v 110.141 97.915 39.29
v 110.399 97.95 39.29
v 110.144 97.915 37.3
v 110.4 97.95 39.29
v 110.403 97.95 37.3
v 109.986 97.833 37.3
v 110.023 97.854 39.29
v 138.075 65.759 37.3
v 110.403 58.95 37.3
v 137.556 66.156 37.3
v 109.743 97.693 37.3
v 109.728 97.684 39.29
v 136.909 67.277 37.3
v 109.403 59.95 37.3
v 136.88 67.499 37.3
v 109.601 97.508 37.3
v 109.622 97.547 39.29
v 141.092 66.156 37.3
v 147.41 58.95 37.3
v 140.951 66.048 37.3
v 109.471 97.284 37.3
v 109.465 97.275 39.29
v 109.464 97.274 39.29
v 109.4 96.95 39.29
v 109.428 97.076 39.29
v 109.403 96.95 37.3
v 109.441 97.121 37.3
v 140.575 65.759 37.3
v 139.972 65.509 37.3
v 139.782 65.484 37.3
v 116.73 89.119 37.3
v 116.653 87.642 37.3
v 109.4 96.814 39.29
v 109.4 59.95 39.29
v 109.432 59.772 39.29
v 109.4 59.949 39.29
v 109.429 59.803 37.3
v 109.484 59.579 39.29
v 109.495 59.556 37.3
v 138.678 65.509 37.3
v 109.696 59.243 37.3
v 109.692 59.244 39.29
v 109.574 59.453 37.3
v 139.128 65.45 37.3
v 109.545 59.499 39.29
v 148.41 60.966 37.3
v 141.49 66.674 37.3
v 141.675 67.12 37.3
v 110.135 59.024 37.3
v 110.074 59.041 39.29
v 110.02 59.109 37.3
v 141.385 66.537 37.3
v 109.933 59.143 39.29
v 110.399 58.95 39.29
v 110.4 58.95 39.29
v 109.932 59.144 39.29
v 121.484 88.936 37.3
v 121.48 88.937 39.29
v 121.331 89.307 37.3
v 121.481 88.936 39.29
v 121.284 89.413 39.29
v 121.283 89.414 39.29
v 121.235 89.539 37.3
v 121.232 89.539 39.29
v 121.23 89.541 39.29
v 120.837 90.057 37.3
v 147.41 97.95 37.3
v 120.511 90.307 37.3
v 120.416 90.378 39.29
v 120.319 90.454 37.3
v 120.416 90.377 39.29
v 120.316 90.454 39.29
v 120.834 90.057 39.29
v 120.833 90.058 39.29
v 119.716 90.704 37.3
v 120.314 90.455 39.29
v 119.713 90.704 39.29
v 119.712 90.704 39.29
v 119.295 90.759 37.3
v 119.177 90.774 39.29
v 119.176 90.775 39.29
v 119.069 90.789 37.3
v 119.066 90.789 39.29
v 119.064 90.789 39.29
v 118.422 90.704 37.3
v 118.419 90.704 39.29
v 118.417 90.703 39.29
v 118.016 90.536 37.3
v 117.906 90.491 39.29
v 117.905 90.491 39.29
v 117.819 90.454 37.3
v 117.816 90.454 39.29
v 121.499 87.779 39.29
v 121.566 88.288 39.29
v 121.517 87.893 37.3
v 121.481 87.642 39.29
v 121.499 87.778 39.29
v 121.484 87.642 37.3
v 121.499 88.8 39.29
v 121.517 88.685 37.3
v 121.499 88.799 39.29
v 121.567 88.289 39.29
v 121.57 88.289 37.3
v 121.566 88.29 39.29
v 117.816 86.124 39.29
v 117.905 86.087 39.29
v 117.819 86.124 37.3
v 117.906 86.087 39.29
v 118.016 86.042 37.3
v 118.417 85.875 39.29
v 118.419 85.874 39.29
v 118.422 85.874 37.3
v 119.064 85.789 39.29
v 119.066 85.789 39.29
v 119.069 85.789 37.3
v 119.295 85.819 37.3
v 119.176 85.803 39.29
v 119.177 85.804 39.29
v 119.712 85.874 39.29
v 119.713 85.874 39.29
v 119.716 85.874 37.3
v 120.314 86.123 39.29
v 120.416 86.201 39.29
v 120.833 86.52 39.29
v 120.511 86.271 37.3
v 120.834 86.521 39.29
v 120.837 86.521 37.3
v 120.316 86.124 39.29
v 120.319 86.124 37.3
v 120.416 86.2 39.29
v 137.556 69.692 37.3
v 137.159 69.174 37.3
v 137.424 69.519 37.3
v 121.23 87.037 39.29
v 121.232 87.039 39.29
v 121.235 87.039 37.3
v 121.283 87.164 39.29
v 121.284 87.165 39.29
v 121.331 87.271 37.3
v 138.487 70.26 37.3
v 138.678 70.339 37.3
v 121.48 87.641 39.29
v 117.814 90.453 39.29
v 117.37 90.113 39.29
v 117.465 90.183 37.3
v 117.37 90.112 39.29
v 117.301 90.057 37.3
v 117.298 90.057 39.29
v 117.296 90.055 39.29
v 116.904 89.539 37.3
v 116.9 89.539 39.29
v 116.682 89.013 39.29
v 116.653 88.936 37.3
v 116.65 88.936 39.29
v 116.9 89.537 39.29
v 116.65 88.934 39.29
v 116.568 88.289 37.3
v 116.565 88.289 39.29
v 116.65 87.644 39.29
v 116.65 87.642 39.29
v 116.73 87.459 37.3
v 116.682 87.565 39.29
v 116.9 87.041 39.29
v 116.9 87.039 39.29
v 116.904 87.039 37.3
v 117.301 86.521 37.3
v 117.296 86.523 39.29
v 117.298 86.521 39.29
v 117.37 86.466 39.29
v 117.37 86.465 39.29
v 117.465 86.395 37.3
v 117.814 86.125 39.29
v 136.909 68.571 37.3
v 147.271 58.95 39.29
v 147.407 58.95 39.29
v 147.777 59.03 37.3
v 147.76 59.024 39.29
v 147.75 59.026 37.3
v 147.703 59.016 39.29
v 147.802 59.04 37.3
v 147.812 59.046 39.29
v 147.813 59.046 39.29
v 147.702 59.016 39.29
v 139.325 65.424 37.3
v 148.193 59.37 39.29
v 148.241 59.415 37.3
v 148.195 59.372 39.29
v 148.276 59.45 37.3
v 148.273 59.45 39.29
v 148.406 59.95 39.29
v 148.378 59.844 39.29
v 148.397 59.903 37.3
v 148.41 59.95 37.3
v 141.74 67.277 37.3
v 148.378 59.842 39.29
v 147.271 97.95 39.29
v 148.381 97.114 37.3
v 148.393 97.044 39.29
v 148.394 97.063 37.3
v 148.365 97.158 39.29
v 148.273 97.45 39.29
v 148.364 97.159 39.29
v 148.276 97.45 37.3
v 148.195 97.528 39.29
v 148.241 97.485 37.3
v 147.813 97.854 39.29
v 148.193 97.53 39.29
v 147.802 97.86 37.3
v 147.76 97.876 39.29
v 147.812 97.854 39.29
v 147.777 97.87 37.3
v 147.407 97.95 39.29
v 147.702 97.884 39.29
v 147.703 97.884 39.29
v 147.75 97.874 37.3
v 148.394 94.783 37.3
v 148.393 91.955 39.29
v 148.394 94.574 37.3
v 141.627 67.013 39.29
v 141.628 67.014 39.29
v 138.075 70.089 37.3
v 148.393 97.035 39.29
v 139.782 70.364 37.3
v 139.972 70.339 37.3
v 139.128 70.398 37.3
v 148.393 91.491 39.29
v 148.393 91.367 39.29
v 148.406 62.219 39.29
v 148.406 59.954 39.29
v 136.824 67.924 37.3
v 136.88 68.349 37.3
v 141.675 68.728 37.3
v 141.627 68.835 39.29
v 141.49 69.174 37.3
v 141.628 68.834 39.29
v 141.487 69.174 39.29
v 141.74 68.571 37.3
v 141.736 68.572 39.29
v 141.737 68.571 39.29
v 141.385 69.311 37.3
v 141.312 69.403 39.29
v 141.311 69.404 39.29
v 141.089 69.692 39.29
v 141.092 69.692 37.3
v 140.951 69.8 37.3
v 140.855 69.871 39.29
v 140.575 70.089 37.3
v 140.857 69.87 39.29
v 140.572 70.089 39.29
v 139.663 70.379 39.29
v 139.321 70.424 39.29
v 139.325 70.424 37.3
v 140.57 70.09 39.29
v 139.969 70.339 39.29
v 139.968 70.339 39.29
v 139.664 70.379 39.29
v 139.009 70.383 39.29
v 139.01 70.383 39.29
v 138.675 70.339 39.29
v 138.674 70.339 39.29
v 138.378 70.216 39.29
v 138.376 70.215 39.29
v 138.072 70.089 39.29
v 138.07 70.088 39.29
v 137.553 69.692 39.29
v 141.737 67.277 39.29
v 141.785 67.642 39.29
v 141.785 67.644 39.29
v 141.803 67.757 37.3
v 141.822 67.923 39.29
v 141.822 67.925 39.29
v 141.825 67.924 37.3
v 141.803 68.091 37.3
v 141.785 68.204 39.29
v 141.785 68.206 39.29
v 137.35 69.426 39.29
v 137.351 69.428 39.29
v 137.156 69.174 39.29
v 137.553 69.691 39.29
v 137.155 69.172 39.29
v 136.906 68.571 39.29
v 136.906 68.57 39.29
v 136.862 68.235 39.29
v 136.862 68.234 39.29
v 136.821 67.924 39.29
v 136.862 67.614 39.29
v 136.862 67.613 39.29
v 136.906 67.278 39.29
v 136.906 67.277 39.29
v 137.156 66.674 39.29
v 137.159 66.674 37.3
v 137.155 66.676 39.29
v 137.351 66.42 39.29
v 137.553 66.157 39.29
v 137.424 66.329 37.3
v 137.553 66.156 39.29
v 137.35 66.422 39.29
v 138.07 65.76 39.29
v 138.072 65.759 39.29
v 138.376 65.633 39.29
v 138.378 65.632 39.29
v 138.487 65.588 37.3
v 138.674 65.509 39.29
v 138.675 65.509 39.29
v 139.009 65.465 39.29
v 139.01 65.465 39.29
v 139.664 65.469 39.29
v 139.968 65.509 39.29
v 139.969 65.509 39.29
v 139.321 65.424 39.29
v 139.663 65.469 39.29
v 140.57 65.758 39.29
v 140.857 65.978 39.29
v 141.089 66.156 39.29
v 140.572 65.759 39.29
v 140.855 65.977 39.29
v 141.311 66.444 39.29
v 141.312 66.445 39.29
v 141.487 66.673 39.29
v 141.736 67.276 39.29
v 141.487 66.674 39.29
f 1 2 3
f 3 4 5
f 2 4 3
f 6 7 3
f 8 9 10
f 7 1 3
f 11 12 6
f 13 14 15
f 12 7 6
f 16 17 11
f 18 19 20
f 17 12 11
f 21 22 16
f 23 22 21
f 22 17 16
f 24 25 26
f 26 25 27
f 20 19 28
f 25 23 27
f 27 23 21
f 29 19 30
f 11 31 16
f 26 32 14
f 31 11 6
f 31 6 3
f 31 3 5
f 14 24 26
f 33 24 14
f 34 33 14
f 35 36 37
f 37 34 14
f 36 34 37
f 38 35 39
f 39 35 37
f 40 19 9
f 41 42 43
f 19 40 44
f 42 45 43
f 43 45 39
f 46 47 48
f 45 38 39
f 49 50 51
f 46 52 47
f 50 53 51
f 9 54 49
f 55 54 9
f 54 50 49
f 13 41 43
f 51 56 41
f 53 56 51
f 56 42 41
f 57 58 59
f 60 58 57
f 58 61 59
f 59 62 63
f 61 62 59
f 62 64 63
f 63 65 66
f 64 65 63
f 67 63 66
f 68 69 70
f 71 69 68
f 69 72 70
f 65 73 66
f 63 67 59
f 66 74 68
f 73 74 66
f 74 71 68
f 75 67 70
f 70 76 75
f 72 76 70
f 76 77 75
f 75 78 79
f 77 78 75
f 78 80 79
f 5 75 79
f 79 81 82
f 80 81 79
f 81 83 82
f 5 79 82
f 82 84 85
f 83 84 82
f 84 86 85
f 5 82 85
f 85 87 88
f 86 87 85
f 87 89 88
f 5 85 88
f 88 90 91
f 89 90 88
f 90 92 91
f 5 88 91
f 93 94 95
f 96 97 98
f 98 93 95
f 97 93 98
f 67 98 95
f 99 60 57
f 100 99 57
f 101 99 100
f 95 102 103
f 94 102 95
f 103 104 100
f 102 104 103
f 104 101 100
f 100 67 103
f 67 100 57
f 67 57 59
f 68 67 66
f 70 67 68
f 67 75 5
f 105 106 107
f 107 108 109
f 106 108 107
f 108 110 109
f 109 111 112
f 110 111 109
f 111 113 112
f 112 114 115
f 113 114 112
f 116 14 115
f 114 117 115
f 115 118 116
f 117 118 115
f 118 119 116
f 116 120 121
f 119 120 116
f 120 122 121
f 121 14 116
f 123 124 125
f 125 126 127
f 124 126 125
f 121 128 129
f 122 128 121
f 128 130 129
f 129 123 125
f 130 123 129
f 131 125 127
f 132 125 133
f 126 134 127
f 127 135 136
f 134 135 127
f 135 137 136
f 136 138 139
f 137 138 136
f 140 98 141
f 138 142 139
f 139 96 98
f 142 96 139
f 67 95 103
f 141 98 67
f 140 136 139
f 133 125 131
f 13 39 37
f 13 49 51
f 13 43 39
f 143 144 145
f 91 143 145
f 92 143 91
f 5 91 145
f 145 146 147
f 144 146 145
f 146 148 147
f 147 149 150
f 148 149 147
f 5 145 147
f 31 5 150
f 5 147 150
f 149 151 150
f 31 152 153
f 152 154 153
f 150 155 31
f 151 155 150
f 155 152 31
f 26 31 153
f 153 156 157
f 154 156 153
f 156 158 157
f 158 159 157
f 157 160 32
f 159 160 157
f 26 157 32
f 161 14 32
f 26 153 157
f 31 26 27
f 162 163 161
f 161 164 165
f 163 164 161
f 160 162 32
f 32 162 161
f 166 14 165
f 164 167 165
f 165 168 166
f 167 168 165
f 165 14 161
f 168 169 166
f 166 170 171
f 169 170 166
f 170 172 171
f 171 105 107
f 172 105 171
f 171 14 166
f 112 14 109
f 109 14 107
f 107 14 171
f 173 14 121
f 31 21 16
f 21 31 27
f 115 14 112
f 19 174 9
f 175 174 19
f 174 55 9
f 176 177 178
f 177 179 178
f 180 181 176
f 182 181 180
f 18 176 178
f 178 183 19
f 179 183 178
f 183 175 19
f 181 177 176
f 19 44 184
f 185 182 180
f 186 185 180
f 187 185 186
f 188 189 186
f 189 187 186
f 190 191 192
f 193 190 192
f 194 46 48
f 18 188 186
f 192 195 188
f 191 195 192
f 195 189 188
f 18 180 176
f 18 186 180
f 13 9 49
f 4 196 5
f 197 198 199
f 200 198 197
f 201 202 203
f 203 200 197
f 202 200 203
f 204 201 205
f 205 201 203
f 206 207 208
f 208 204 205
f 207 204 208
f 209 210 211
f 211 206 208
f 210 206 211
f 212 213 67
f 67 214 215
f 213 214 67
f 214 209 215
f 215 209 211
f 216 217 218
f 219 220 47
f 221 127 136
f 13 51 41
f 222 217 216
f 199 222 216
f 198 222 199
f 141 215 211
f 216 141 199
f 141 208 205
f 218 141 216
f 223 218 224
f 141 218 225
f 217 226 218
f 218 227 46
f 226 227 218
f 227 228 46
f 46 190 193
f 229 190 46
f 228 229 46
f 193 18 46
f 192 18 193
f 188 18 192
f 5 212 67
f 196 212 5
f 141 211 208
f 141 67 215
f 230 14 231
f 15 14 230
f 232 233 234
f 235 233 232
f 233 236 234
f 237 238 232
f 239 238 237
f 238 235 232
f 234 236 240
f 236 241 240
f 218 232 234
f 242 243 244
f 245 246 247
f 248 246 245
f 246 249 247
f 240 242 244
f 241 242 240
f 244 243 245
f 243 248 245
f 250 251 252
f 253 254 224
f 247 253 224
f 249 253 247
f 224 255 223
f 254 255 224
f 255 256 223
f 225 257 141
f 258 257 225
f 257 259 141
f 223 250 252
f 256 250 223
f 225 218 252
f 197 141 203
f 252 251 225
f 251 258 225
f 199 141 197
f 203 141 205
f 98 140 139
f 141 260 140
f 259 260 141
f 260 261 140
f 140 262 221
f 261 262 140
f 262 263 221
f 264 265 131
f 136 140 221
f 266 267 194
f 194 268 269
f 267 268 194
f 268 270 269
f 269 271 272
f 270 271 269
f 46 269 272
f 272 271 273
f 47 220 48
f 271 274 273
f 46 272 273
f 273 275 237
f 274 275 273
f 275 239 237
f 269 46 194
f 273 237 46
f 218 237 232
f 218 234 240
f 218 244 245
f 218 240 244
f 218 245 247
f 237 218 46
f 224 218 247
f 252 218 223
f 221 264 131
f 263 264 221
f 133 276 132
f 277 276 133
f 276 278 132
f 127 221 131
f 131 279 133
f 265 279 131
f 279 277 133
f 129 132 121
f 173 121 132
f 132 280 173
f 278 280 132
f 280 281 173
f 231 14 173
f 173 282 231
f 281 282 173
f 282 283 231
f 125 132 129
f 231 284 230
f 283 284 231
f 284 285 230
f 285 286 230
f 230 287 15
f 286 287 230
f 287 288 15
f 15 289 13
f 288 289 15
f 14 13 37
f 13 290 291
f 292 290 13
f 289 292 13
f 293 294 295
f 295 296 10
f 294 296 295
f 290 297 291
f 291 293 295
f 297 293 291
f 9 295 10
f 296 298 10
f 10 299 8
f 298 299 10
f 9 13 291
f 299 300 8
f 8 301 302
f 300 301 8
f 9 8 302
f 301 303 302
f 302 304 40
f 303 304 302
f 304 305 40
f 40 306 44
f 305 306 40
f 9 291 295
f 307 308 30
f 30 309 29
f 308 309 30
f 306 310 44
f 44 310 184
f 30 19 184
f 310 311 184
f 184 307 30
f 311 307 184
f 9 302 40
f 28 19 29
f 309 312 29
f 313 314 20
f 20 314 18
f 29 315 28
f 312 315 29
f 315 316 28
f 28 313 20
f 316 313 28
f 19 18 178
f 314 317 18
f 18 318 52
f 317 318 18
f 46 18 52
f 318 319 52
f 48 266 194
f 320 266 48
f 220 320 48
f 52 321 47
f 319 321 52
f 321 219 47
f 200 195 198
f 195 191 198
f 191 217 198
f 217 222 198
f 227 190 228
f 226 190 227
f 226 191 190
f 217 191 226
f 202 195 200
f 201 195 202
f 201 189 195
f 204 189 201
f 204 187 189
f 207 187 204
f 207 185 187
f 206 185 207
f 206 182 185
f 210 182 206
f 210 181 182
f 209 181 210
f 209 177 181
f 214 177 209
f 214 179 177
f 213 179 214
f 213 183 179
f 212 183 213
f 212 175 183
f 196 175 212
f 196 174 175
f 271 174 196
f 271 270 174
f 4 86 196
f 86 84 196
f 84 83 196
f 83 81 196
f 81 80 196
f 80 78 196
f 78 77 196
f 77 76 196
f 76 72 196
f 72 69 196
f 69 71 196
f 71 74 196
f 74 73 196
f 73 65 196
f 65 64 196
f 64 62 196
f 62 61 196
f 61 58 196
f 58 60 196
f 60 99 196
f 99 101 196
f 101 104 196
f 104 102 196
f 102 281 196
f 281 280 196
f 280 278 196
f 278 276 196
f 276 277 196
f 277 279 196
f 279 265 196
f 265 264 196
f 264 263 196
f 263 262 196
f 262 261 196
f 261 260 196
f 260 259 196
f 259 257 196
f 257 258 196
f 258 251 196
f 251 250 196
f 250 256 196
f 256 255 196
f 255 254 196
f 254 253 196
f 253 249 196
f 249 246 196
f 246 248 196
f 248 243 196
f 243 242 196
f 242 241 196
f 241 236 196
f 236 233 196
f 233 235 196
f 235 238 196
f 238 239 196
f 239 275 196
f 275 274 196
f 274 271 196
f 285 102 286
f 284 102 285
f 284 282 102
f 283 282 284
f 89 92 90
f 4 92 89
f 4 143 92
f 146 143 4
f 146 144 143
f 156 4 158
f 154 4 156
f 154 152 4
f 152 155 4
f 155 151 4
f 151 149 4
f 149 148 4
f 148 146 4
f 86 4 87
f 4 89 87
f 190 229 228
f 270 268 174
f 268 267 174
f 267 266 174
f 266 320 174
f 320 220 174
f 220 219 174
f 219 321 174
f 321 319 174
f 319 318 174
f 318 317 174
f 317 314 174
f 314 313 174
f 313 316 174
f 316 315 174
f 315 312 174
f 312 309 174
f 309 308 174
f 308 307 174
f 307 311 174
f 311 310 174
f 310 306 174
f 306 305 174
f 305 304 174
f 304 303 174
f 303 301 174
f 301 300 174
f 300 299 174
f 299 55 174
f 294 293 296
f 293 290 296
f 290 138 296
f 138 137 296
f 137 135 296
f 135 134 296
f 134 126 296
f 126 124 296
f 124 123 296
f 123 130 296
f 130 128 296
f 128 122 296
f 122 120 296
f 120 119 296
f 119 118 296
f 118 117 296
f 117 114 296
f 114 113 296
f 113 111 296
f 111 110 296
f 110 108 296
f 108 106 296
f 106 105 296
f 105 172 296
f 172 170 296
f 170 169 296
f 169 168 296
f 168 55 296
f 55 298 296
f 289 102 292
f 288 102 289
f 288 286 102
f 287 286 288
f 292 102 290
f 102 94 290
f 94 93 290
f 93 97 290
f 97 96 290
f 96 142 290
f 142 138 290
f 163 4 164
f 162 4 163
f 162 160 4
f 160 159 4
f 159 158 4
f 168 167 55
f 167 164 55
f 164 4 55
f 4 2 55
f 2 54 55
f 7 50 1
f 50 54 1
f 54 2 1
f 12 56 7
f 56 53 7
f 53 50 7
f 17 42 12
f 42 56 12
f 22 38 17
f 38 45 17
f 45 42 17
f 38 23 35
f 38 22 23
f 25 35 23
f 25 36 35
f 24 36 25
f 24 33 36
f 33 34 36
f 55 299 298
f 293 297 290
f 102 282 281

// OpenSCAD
// Generated from front_plate_mount.stl as explicit OpenSCAD polyhedron geometry.
// This file does not import or reference the STL; vertices/faces are embedded.
// Faces are wound for OpenSCAD; geometry was verified by STL export comparison.
// Source mesh: 670 triangles, 2010 raw vertices; deduplicated to 333 vertices.

module front_plate_mount_v1() {
    polyhedron(
        points=[
            [110.143936, 97.914993, 37.299999],
            [110.140900, 97.914993, 39.289639],
            [110.399033, 97.949875, 39.289639],
            [110.403015, 97.949997, 37.299999],
            [110.399979, 97.949997, 39.289639],
            [109.986496, 97.833099, 37.299999],
            [110.023499, 97.853928, 39.289639],
            [137.556366, 66.155991, 37.299999],
            [138.074509, 65.759003, 37.299999],
            [110.403015, 58.949993, 37.299999],
            [109.743118, 97.692917, 37.299999],
            [109.727905, 97.683685, 39.289639],
            [136.879944, 67.499329, 37.299999],
            [136.909164, 67.276993, 37.299999],
            [109.402725, 59.949993, 37.299999],
            [109.601089, 97.508392, 37.299999],
            [109.622421, 97.546616, 39.289639],
            [140.951263, 66.047852, 37.299999],
            [141.092407, 66.155991, 37.299999],
            [147.410126, 58.949993, 37.299999],
            [109.470688, 97.284042, 37.299999],
            [109.464722, 97.275299, 39.289639],
            [109.464127, 97.273865, 39.289639],
            [109.402725, 96.949997, 37.299999],
            [109.399689, 96.949997, 39.289639],
            [109.427628, 97.076050, 39.289639],
            [109.440628, 97.121002, 37.299999],
            [140.574982, 65.759003, 37.299999],
            [139.782227, 65.484100, 37.299999],
            [139.971786, 65.509003, 37.299999],
            [116.729523, 89.119431, 37.299999],
            [116.653458, 87.641998, 37.299999],
            [109.399689, 96.813644, 39.289639],
            [109.399689, 59.949993, 39.289639],
            [109.429138, 59.803387, 37.299999],
            [109.431717, 59.772213, 39.289639],
            [109.399780, 59.949459, 39.289639],
            [109.495468, 59.556011, 37.299999],
            [109.483627, 59.578625, 39.289639],
            [138.677689, 65.509003, 37.299999],
            [109.574432, 59.453159, 37.299999],
            [109.695801, 59.242992, 37.299999],
            [109.692322, 59.243771, 39.289639],
            [139.127945, 65.449860, 37.299999],
            [109.545120, 59.498516, 39.289639],
            [141.674637, 67.120346, 37.299999],
            [148.409531, 60.965794, 37.299999],
            [141.490265, 66.673996, 37.299999],
            [110.019653, 59.108829, 37.299999],
            [110.135239, 59.024364, 37.299999],
            [110.073608, 59.040829, 39.289639],
            [141.385086, 66.536819, 37.299999],
            [109.933304, 59.143337, 39.289639],
            [110.399002, 58.950268, 39.289639],
            [110.399979, 58.949993, 39.289639],
            [109.932114, 59.143833, 39.289639],
            [121.330688, 89.307083, 37.299999],
            [121.483978, 88.936005, 37.299999],
            [121.480255, 88.937363, 39.289639],
            [121.480820, 88.936005, 39.289639],
            [121.283707, 89.413208, 39.289639],
            [121.234512, 89.539001, 37.299999],
            [121.283340, 89.414062, 39.289639],
            [121.231537, 89.539001, 39.289639],
            [120.837387, 90.056992, 37.299999],
            [121.230072, 89.540909, 39.289639],
            [147.410126, 97.949997, 37.299999],
            [120.319244, 90.453995, 37.299999],
            [120.511078, 90.307007, 37.299999],
            [120.415771, 90.377747, 39.289639],
            [120.416473, 90.377213, 39.289639],
            [120.316254, 90.453995, 39.289639],
            [120.834412, 90.056992, 39.289639],
            [120.833206, 90.057922, 39.289639],
            [119.716064, 90.703995, 37.299999],
            [120.314041, 90.454926, 39.289639],
            [119.713074, 90.703995, 39.289639],
            [119.294739, 90.759338, 37.299999],
            [119.711533, 90.704208, 39.289639],
            [119.177063, 90.774399, 39.289639],
            [119.068863, 90.789001, 37.299999],
            [119.176224, 90.774506, 39.289639],
            [119.065887, 90.789001, 39.289639],
            [118.421677, 90.703995, 37.299999],
            [119.063507, 90.788681, 39.289639],
            [118.418701, 90.703995, 39.289639],
            [118.015533, 90.535660, 37.299999],
            [118.417206, 90.703384, 39.289639],
            [117.905731, 90.491394, 39.289639],
            [117.818817, 90.453995, 37.299999],
            [117.904999, 90.491089, 39.289639],
            [117.815659, 90.453995, 39.289639],
            [121.516953, 87.892929, 37.299999],
            [121.498871, 87.779388, 39.289639],
            [121.566437, 88.287537, 39.289639],
            [121.483978, 87.641998, 37.299999],
            [121.480820, 87.641998, 39.289639],
            [121.498749, 87.778458, 39.289639],
            [121.498749, 88.799530, 39.289639],
            [121.516953, 88.685059, 37.299999],
            [121.498871, 88.798615, 39.289639],
            [121.569611, 88.289001, 37.299999],
            [121.566635, 88.289001, 39.289639],
            [121.566437, 88.290451, 39.289639],
            [117.818817, 86.123993, 37.299999],
            [117.815659, 86.123993, 39.289639],
            [117.904999, 86.086914, 39.289639],
            [118.015533, 86.042328, 37.299999],
            [117.905731, 86.086609, 39.289639],
            [118.417206, 85.874619, 39.289639],
            [118.421677, 85.873993, 37.299999],
            [118.418701, 85.873993, 39.289639],
            [119.063507, 85.789307, 39.289639],
            [119.068863, 85.789001, 37.299999],
            [119.065887, 85.789001, 39.289639],
            [119.294739, 85.818665, 37.299999],
            [119.176224, 85.803482, 39.289639],
            [119.177063, 85.803604, 39.289639],
            [119.711533, 85.873795, 39.289639],
            [119.716064, 85.873993, 37.299999],
            [119.713074, 85.873993, 39.289639],
            [120.314041, 86.123077, 39.289639],
            [120.511078, 86.270981, 37.299999],
            [120.416473, 86.200790, 39.289639],
            [120.833206, 86.520081, 39.289639],
            [120.837387, 86.520996, 37.299999],
            [120.834412, 86.520996, 39.289639],
            [120.319244, 86.123993, 37.299999],
            [120.316254, 86.123993, 39.289639],
            [120.415771, 86.200241, 39.289639],
            [137.556366, 69.692001, 37.299999],
            [137.423691, 69.518951, 37.299999],
            [137.159241, 69.173996, 37.299999],
            [121.230072, 87.037094, 39.289639],
            [121.234512, 87.039001, 37.299999],
            [121.231537, 87.039001, 39.289639],
            [121.283340, 87.163940, 39.289639],
            [121.330688, 87.270920, 37.299999],
            [121.283707, 87.164795, 39.289639],
            [138.677689, 70.339005, 37.299999],
            [138.487366, 70.260117, 37.299999],
            [121.480255, 87.640625, 39.289639],
            [117.464920, 90.182846, 37.299999],
            [117.814362, 90.453003, 39.289639],
            [117.370132, 90.112656, 39.289639],
            [117.300659, 90.056992, 37.299999],
            [117.369537, 90.112183, 39.289639],
            [117.297501, 90.056992, 39.289639],
            [116.903534, 89.539001, 37.299999],
            [117.296036, 90.055084, 39.289639],
            [116.900375, 89.539001, 39.289639],
            [116.653458, 88.936005, 37.299999],
            [116.682083, 89.012634, 39.289639],
            [116.682358, 89.013306, 39.289639],
            [116.650299, 88.936005, 39.289639],
            [116.899734, 89.537445, 39.289639],
            [116.568420, 88.289001, 37.299999],
            [116.649979, 88.933609, 39.289639],
            [116.565277, 88.289001, 39.289639],
            [116.649979, 87.644379, 39.289639],
            [116.650299, 87.641998, 39.289639],
            [116.729523, 87.458557, 37.299999],
            [116.682358, 87.564697, 39.289639],
            [116.899734, 87.040543, 39.289639],
            [116.903534, 87.039001, 37.299999],
            [116.900375, 87.039001, 39.289639],
            [116.682083, 87.565369, 39.289639],
            [117.300659, 86.520996, 37.299999],
            [117.296036, 86.522903, 39.289639],
            [117.297501, 86.520996, 39.289639],
            [117.369537, 86.465805, 39.289639],
            [117.464920, 86.395142, 37.299999],
            [117.370132, 86.465347, 39.289639],
            [117.814362, 86.125000, 39.289639],
            [136.909164, 68.570999, 37.299999],
            [147.270584, 58.949993, 39.289639],
            [147.406967, 58.949993, 39.289639],
            [147.750427, 59.026295, 37.299999],
            [147.776993, 59.029888, 37.299999],
            [147.759705, 59.024029, 39.289639],
            [147.759796, 59.024044, 39.289639],
            [147.702789, 59.016323, 39.289639],
            [147.801559, 59.039989, 37.299999],
            [147.812439, 59.045666, 39.289639],
            [147.812531, 59.045704, 39.289639],
            [147.701538, 59.016041, 39.289639],
            [139.324585, 65.423996, 37.299999],
            [148.193268, 59.370289, 39.289639],
            [148.240997, 59.414608, 37.299999],
            [148.194885, 59.371670, 39.289639],
            [148.276398, 59.449993, 37.299999],
            [148.273117, 59.449871, 39.289639],
            [148.273239, 59.449993, 39.289639],
            [148.396820, 59.902569, 37.299999],
            [148.406448, 59.949825, 39.289639],
            [148.378098, 59.844067, 39.289639],
            [148.409531, 59.949993, 37.299999],
            [141.739594, 67.276993, 37.299999],
            [148.377655, 59.842403, 39.289639],
            [147.270584, 97.949997, 39.289639],
            [148.394135, 97.063156, 37.299999],
            [148.381409, 97.114243, 37.299999],
            [148.393097, 97.043655, 39.289639],
            [148.393051, 97.043839, 39.289639],
            [148.364685, 97.157654, 39.289639],
            [148.276398, 97.449997, 37.299999],
            [148.273239, 97.449997, 39.289639],
            [148.364288, 97.158890, 39.289639],
            [148.240997, 97.485397, 37.299999],
            [148.194885, 97.528320, 39.289639],
            [148.273117, 97.450134, 39.289639],
            [147.801559, 97.860016, 37.299999],
            [147.812531, 97.854294, 39.289639],
            [148.193268, 97.529709, 39.289639],
            [147.776993, 97.870102, 37.299999],
            [147.759796, 97.875946, 39.289639],
            [147.812439, 97.854324, 39.289639],
            [147.406967, 97.949997, 39.289639],
            [147.701538, 97.883957, 39.289639],
            [147.750427, 97.873703, 37.299999],
            [147.702789, 97.883667, 39.289639],
            [147.759705, 97.875961, 39.289639],
            [148.394135, 94.574310, 37.299999],
            [148.394104, 94.782990, 37.299999],
            [148.392975, 91.955353, 39.289639],
            [141.626953, 67.012573, 39.289639],
            [141.627640, 67.014221, 39.289639],
            [138.074509, 70.089005, 37.299999],
            [148.393097, 97.035248, 39.289639],
            [139.971786, 70.339005, 37.299999],
            [139.782227, 70.363892, 37.299999],
            [139.127945, 70.398132, 37.299999],
            [148.393097, 91.490524, 39.289639],
            [148.393158, 91.366653, 39.289639],
            [148.406494, 62.218777, 39.289639],
            [148.406494, 59.953739, 39.289639],
            [136.879944, 68.348679, 37.299999],
            [136.824142, 67.923996, 37.299999],
            [141.490265, 69.173996, 37.299999],
            [141.674637, 68.727661, 37.299999],
            [141.626953, 68.835419, 39.289639],
            [141.627640, 68.833786, 39.289639],
            [141.487106, 69.173996, 39.289639],
            [141.739594, 68.570999, 37.299999],
            [141.736374, 68.571579, 39.289639],
            [141.736618, 68.570999, 39.289639],
            [141.385086, 69.311188, 37.299999],
            [141.486725, 69.174500, 39.289639],
            [141.311859, 69.402588, 39.289639],
            [141.092407, 69.692001, 37.299999],
            [141.310776, 69.403992, 39.289639],
            [141.089432, 69.692001, 39.289639],
            [140.574982, 70.089005, 37.299999],
            [140.951263, 69.800140, 37.299999],
            [140.855270, 69.871399, 39.289639],
            [140.856659, 69.870346, 39.289639],
            [140.571823, 70.089005, 39.289639],
            [141.088913, 69.692398, 39.289639],
            [139.324585, 70.423996, 37.299999],
            [139.662674, 70.379181, 39.289639],
            [139.321426, 70.423996, 39.289639],
            [140.569595, 70.089920, 39.289639],
            [139.968628, 70.339005, 39.289639],
            [139.967926, 70.339096, 39.289639],
            [139.664368, 70.378952, 39.289639],
            [139.008606, 70.382843, 39.289639],
            [139.010269, 70.383072, 39.289639],
            [138.674713, 70.339005, 39.289639],
            [139.320709, 70.423904, 39.289639],
            [138.674011, 70.338715, 39.289639],
            [138.377579, 70.215836, 39.289639],
            [138.376053, 70.215210, 39.289639],
            [138.071533, 70.089005, 39.289639],
            [138.069626, 70.087540, 39.289639],
            [137.553375, 69.692001, 39.289639],
            [141.736618, 67.276993, 39.289639],
            [141.785156, 67.642059, 39.289639],
            [141.803467, 67.757370, 37.299999],
            [141.785400, 67.643829, 39.289639],
            [141.822128, 67.923386, 39.289639],
            [141.825363, 67.923996, 37.299999],
            [141.822128, 67.924606, 39.289639],
            [141.803467, 68.090622, 37.299999],
            [141.785400, 68.204163, 39.289639],
            [141.785156, 68.205933, 39.289639],
            [137.349670, 69.426270, 39.289639],
            [137.350647, 69.427551, 39.289639],
            [137.156265, 69.173996, 39.289639],
            [137.552887, 69.691360, 39.289639],
            [137.155334, 69.171768, 39.289639],
            [136.906189, 68.570999, 39.289639],
            [136.906082, 68.570175, 39.289639],
            [136.862045, 68.235138, 39.289639],
            [136.861847, 68.233566, 39.289639],
            [136.821167, 67.923996, 39.289639],
            [136.861847, 67.614426, 39.289639],
            [136.862045, 67.612854, 39.289639],
            [136.906082, 67.277817, 39.289639],
            [136.906189, 67.276993, 39.289639],
            [137.159241, 66.673996, 37.299999],
            [137.156265, 66.673996, 39.289639],
            [137.155334, 66.676224, 39.289639],
            [137.423691, 66.329041, 37.299999],
            [137.350647, 66.420441, 39.289639],
            [137.552887, 66.156631, 39.289639],
            [137.553375, 66.155991, 39.289639],
            [137.349670, 66.421722, 39.289639],
            [138.069626, 65.760468, 39.289639],
            [138.071533, 65.759003, 39.289639],
            [138.376053, 65.632782, 39.289639],
            [138.487366, 65.587875, 37.299999],
            [138.377579, 65.632156, 39.289639],
            [138.674011, 65.509293, 39.289639],
            [138.674713, 65.509003, 39.289639],
            [139.008606, 65.465149, 39.289639],
            [139.010269, 65.464935, 39.289639],
            [139.664368, 65.469040, 39.289639],
            [139.967926, 65.508911, 39.289639],
            [139.968628, 65.509003, 39.289639],
            [139.320709, 65.424088, 39.289639],
            [139.321426, 65.423996, 39.289639],
            [139.662674, 65.468811, 39.289639],
            [140.569595, 65.758072, 39.289639],
            [140.856659, 65.977661, 39.289639],
            [141.088913, 66.155594, 39.289639],
            [141.089432, 66.155991, 39.289639],
            [140.571823, 65.759003, 39.289639],
            [140.855270, 65.976593, 39.289639],
            [141.310776, 66.444000, 39.289639],
            [141.311859, 66.445404, 39.289639],
            [141.486725, 66.673492, 39.289639],
            [141.736374, 67.276428, 39.289639],
            [141.487106, 66.673996, 39.289639],
        ],
        faces=[
            [0, 2, 1],
            [3, 4, 0],
            [0, 4, 2],
            [0, 6, 5],
            [7, 9, 8],
            [0, 1, 6],
            [5, 11, 10],
            [12, 14, 13],
            [5, 6, 11],
            [10, 16, 15],
            [17, 19, 18],
            [10, 11, 16],
            [15, 21, 20],
            [20, 21, 22],
            [15, 16, 21],
            [23, 25, 24],
            [26, 25, 23],
            [27, 19, 17],
            [26, 22, 25],
            [20, 22, 26],
            [28, 19, 29],
            [15, 30, 10],
            [14, 31, 23],
            [5, 10, 30],
            [0, 5, 30],
            [3, 0, 30],
            [23, 24, 14],
            [14, 24, 32],
            [14, 32, 33],
            [34, 36, 35],
            [14, 33, 34],
            [34, 33, 36],
            [37, 35, 38],
            [34, 35, 37],
            [9, 19, 39],
            [40, 42, 41],
            [43, 39, 19],
            [40, 44, 42],
            [37, 44, 40],
            [45, 47, 46],
            [37, 38, 44],
            [48, 50, 49],
            [47, 51, 46],
            [48, 52, 50],
            [49, 53, 9],
            [9, 53, 54],
            [49, 50, 53],
            [40, 41, 13],
            [41, 55, 48],
            [48, 55, 52],
            [41, 42, 55],
            [56, 58, 57],
            [57, 58, 59],
            [56, 60, 58],
            [61, 62, 56],
            [56, 62, 60],
            [61, 63, 62],
            [64, 65, 61],
            [61, 65, 63],
            [64, 61, 66],
            [67, 69, 68],
            [68, 69, 70],
            [67, 71, 69],
            [64, 72, 65],
            [56, 66, 61],
            [68, 73, 64],
            [64, 73, 72],
            [68, 70, 73],
            [67, 66, 74],
            [74, 75, 67],
            [67, 75, 71],
            [74, 76, 75],
            [77, 78, 74],
            [74, 78, 76],
            [77, 79, 78],
            [77, 74, 3],
            [80, 81, 77],
            [77, 81, 79],
            [80, 82, 81],
            [80, 77, 3],
            [83, 84, 80],
            [80, 84, 82],
            [83, 85, 84],
            [83, 80, 3],
            [86, 87, 83],
            [83, 87, 85],
            [86, 88, 87],
            [86, 83, 3],
            [89, 90, 86],
            [86, 90, 88],
            [89, 91, 90],
            [89, 86, 3],
            [92, 94, 93],
            [95, 97, 96],
            [92, 93, 95],
            [95, 93, 97],
            [92, 95, 66],
            [57, 59, 98],
            [57, 98, 99],
            [99, 98, 100],
            [101, 102, 92],
            [92, 102, 94],
            [99, 103, 101],
            [101, 103, 102],
            [99, 100, 103],
            [101, 66, 99],
            [57, 99, 66],
            [56, 57, 66],
            [64, 66, 68],
            [68, 66, 67],
            [3, 74, 66],
            [104, 106, 105],
            [107, 108, 104],
            [104, 108, 106],
            [107, 109, 108],
            [110, 111, 107],
            [107, 111, 109],
            [110, 112, 111],
            [113, 114, 110],
            [110, 114, 112],
            [113, 14, 115],
            [113, 116, 114],
            [115, 117, 113],
            [113, 117, 116],
            [115, 118, 117],
            [119, 120, 115],
            [115, 120, 118],
            [119, 121, 120],
            [115, 14, 119],
            [122, 124, 123],
            [125, 126, 122],
            [122, 126, 124],
            [127, 128, 119],
            [119, 128, 121],
            [127, 129, 128],
            [122, 123, 127],
            [127, 123, 129],
            [125, 122, 130],
            [131, 122, 132],
            [125, 133, 126],
            [134, 135, 125],
            [125, 135, 133],
            [134, 136, 135],
            [137, 138, 134],
            [134, 138, 136],
            [139, 95, 140],
            [137, 141, 138],
            [95, 96, 137],
            [137, 96, 141],
            [101, 92, 66],
            [66, 95, 139],
            [137, 134, 140],
            [130, 122, 131],
            [34, 37, 13],
            [48, 49, 13],
            [37, 40, 13],
            [142, 144, 143],
            [142, 143, 89],
            [89, 143, 91],
            [142, 89, 3],
            [145, 146, 142],
            [142, 146, 144],
            [145, 147, 146],
            [148, 149, 145],
            [145, 149, 147],
            [145, 142, 3],
            [148, 3, 30],
            [148, 145, 3],
            [148, 150, 149],
            [151, 152, 30],
            [30, 152, 153],
            [151, 154, 152],
            [30, 155, 148],
            [148, 155, 150],
            [30, 153, 155],
            [151, 30, 23],
            [156, 157, 151],
            [151, 157, 154],
            [156, 158, 157],
            [156, 159, 158],
            [31, 160, 156],
            [156, 160, 159],
            [31, 156, 23],
            [31, 14, 161],
            [156, 151, 23],
            [26, 23, 30],
            [161, 163, 162],
            [164, 165, 161],
            [161, 165, 163],
            [31, 166, 160],
            [161, 162, 31],
            [31, 162, 166],
            [164, 14, 167],
            [164, 168, 165],
            [167, 169, 164],
            [164, 169, 168],
            [161, 14, 164],
            [167, 170, 169],
            [171, 172, 167],
            [167, 172, 170],
            [171, 173, 172],
            [104, 105, 171],
            [171, 105, 173],
            [167, 14, 171],
            [107, 14, 110],
            [104, 14, 107],
            [171, 14, 104],
            [119, 14, 174],
            [15, 20, 30],
            [26, 30, 20],
            [110, 14, 113],
            [9, 175, 19],
            [19, 175, 176],
            [9, 54, 175],
            [177, 179, 178],
            [178, 179, 180],
            [177, 181, 179],
            [178, 183, 182],
            [182, 183, 184],
            [177, 178, 18],
            [19, 185, 177],
            [177, 185, 181],
            [19, 176, 185],
            [178, 180, 183],
            [186, 43, 19],
            [182, 184, 187],
            [182, 187, 188],
            [188, 187, 189],
            [188, 191, 190],
            [190, 191, 192],
            [188, 189, 191],
            [193, 195, 194],
            [193, 194, 196],
            [45, 46, 197],
            [188, 190, 18],
            [190, 198, 193],
            [193, 198, 195],
            [190, 192, 198],
            [178, 182, 18],
            [182, 188, 18],
            [49, 9, 13],
            [3, 199, 4],
            [200, 202, 201],
            [201, 202, 203],
            [201, 203, 204],
            [205, 207, 206],
            [201, 204, 205],
            [205, 204, 207],
            [208, 210, 209],
            [205, 206, 208],
            [208, 206, 210],
            [211, 213, 212],
            [208, 209, 211],
            [211, 209, 213],
            [214, 216, 215],
            [211, 212, 214],
            [214, 212, 216],
            [66, 218, 217],
            [219, 220, 66],
            [66, 220, 218],
            [219, 221, 220],
            [214, 215, 219],
            [219, 215, 221],
            [222, 224, 223],
            [47, 226, 225],
            [134, 125, 227],
            [41, 48, 13],
            [223, 224, 228],
            [223, 228, 200],
            [200, 228, 202],
            [214, 219, 139],
            [200, 139, 223],
            [208, 211, 139],
            [223, 139, 222],
            [229, 222, 230],
            [231, 222, 139],
            [222, 232, 224],
            [46, 233, 222],
            [222, 233, 232],
            [46, 234, 233],
            [196, 194, 46],
            [46, 194, 235],
            [46, 235, 234],
            [46, 18, 196],
            [196, 18, 193],
            [193, 18, 190],
            [66, 217, 3],
            [3, 217, 199],
            [211, 214, 139],
            [219, 66, 139],
            [236, 14, 237],
            [237, 14, 12],
            [238, 240, 239],
            [239, 240, 241],
            [238, 242, 240],
            [239, 244, 243],
            [243, 244, 245],
            [239, 241, 244],
            [246, 247, 238],
            [238, 247, 242],
            [246, 248, 247],
            [238, 239, 222],
            [249, 251, 250],
            [252, 254, 253],
            [253, 254, 255],
            [252, 256, 254],
            [249, 250, 246],
            [246, 250, 248],
            [253, 257, 249],
            [249, 257, 251],
            [253, 255, 257],
            [258, 260, 259],
            [229, 262, 261],
            [229, 261, 252],
            [252, 261, 256],
            [230, 263, 229],
            [229, 263, 262],
            [230, 264, 263],
            [139, 265, 231],
            [231, 265, 266],
            [139, 267, 265],
            [258, 259, 230],
            [230, 259, 264],
            [258, 222, 231],
            [205, 139, 201],
            [231, 268, 258],
            [258, 268, 260],
            [231, 266, 268],
            [201, 139, 200],
            [208, 139, 205],
            [137, 140, 95],
            [140, 269, 139],
            [139, 269, 267],
            [140, 270, 269],
            [227, 271, 140],
            [140, 271, 270],
            [227, 272, 271],
            [130, 274, 273],
            [227, 140, 134],
            [197, 276, 275],
            [277, 278, 197],
            [197, 278, 276],
            [277, 279, 278],
            [280, 281, 277],
            [277, 281, 279],
            [280, 277, 46],
            [282, 281, 280],
            [45, 226, 47],
            [282, 283, 281],
            [282, 280, 46],
            [243, 284, 282],
            [282, 284, 283],
            [243, 245, 284],
            [197, 46, 277],
            [46, 243, 282],
            [239, 243, 222],
            [246, 238, 222],
            [253, 249, 222],
            [249, 246, 222],
            [252, 253, 222],
            [46, 222, 243],
            [252, 222, 229],
            [230, 222, 258],
            [130, 273, 227],
            [227, 273, 272],
            [132, 285, 131],
            [131, 285, 286],
            [132, 287, 285],
            [130, 227, 125],
            [131, 288, 130],
            [130, 288, 274],
            [131, 286, 288],
            [119, 132, 127],
            [132, 119, 174],
            [174, 289, 132],
            [132, 289, 287],
            [174, 290, 289],
            [174, 14, 236],
            [236, 291, 174],
            [174, 291, 290],
            [236, 292, 291],
            [127, 132, 122],
            [237, 293, 236],
            [236, 293, 292],
            [237, 294, 293],
            [237, 295, 294],
            [12, 296, 237],
            [237, 296, 295],
            [12, 297, 296],
            [13, 298, 12],
            [12, 298, 297],
            [34, 13, 14],
            [299, 300, 13],
            [13, 300, 301],
            [13, 301, 298],
            [302, 304, 303],
            [7, 305, 302],
            [302, 305, 304],
            [299, 306, 300],
            [302, 303, 299],
            [299, 303, 306],
            [7, 302, 9],
            [7, 307, 305],
            [8, 308, 7],
            [7, 308, 307],
            [299, 13, 9],
            [8, 309, 308],
            [310, 311, 8],
            [8, 311, 309],
            [310, 8, 9],
            [310, 312, 311],
            [39, 313, 310],
            [310, 313, 312],
            [39, 314, 313],
            [43, 315, 39],
            [39, 315, 314],
            [302, 299, 9],
            [28, 317, 316],
            [29, 318, 28],
            [28, 318, 317],
            [43, 319, 315],
            [186, 320, 43],
            [43, 320, 319],
            [186, 19, 28],
            [186, 321, 320],
            [28, 316, 186],
            [186, 316, 321],
            [39, 310, 9],
            [29, 19, 27],
            [29, 322, 318],
            [17, 324, 323],
            [18, 325, 17],
            [17, 325, 324],
            [27, 326, 29],
            [29, 326, 322],
            [27, 327, 326],
            [17, 323, 27],
            [27, 323, 327],
            [177, 18, 19],
            [18, 328, 325],
            [51, 329, 18],
            [18, 329, 328],
            [51, 18, 46],
            [51, 330, 329],
            [197, 275, 45],
            [45, 275, 331],
            [45, 331, 226],
            [47, 332, 51],
            [51, 332, 330],
            [47, 225, 332],
            [203, 198, 204],
            [203, 195, 198],
            [203, 224, 195],
            [203, 228, 224],
            [203, 202, 228],
            [234, 194, 233],
            [233, 194, 232],
            [194, 195, 232],
            [232, 195, 224],
            [204, 198, 207],
            [207, 198, 206],
            [198, 192, 206],
            [206, 192, 210],
            [192, 191, 210],
            [210, 191, 209],
            [191, 189, 209],
            [209, 189, 213],
            [189, 187, 213],
            [213, 187, 212],
            [187, 184, 212],
            [212, 184, 216],
            [184, 183, 216],
            [216, 183, 215],
            [183, 180, 215],
            [215, 180, 221],
            [180, 179, 221],
            [221, 179, 220],
            [179, 181, 220],
            [220, 181, 218],
            [181, 185, 218],
            [218, 185, 217],
            [185, 176, 217],
            [217, 176, 199],
            [176, 175, 199],
            [199, 175, 281],
            [175, 279, 281],
            [199, 85, 4],
            [199, 84, 85],
            [199, 82, 84],
            [199, 81, 82],
            [199, 79, 81],
            [199, 78, 79],
            [199, 76, 78],
            [199, 75, 76],
            [199, 71, 75],
            [199, 69, 71],
            [199, 70, 69],
            [199, 73, 70],
            [199, 72, 73],
            [199, 65, 72],
            [199, 63, 65],
            [199, 62, 63],
            [199, 60, 62],
            [199, 58, 60],
            [199, 59, 58],
            [199, 98, 59],
            [199, 100, 98],
            [199, 103, 100],
            [199, 102, 103],
            [199, 290, 102],
            [199, 289, 290],
            [199, 287, 289],
            [199, 285, 287],
            [199, 286, 285],
            [199, 288, 286],
            [199, 274, 288],
            [199, 273, 274],
            [199, 272, 273],
            [199, 271, 272],
            [199, 270, 271],
            [199, 269, 270],
            [199, 267, 269],
            [199, 265, 267],
            [199, 266, 265],
            [199, 268, 266],
            [199, 260, 268],
            [199, 259, 260],
            [199, 264, 259],
            [199, 263, 264],
            [199, 262, 263],
            [199, 261, 262],
            [199, 256, 261],
            [199, 254, 256],
            [199, 255, 254],
            [199, 257, 255],
            [199, 251, 257],
            [199, 250, 251],
            [199, 248, 250],
            [199, 247, 248],
            [199, 242, 247],
            [199, 240, 242],
            [199, 241, 240],
            [199, 244, 241],
            [199, 245, 244],
            [199, 284, 245],
            [199, 283, 284],
            [199, 281, 283],
            [295, 102, 294],
            [294, 102, 293],
            [102, 291, 293],
            [293, 291, 292],
            [90, 91, 88],
            [88, 91, 4],
            [91, 143, 4],
            [4, 143, 146],
            [143, 144, 146],
            [158, 4, 157],
            [157, 4, 154],
            [4, 153, 154],
            [154, 153, 152],
            [4, 155, 153],
            [4, 150, 155],
            [4, 149, 150],
            [4, 147, 149],
            [4, 146, 147],
            [87, 4, 85],
            [87, 88, 4],
            [234, 235, 194],
            [175, 278, 279],
            [175, 276, 278],
            [175, 275, 276],
            [175, 331, 275],
            [175, 226, 331],
            [175, 225, 226],
            [175, 332, 225],
            [175, 330, 332],
            [175, 329, 330],
            [175, 328, 329],
            [175, 325, 328],
            [175, 324, 325],
            [175, 323, 324],
            [175, 327, 323],
            [175, 326, 327],
            [175, 322, 326],
            [175, 318, 322],
            [175, 317, 318],
            [175, 316, 317],
            [175, 321, 316],
            [175, 320, 321],
            [175, 319, 320],
            [175, 315, 319],
            [175, 314, 315],
            [175, 313, 314],
            [175, 312, 313],
            [175, 311, 312],
            [175, 309, 311],
            [175, 308, 309],
            [175, 54, 308],
            [305, 303, 304],
            [305, 300, 303],
            [305, 138, 300],
            [305, 136, 138],
            [305, 135, 136],
            [305, 133, 135],
            [305, 126, 133],
            [305, 124, 126],
            [305, 123, 124],
            [305, 129, 123],
            [305, 128, 129],
            [305, 121, 128],
            [305, 120, 121],
            [305, 118, 120],
            [305, 117, 118],
            [305, 116, 117],
            [305, 114, 116],
            [305, 112, 114],
            [305, 111, 112],
            [305, 109, 111],
            [305, 108, 109],
            [305, 106, 108],
            [305, 105, 106],
            [305, 173, 105],
            [305, 172, 173],
            [305, 170, 172],
            [305, 169, 170],
            [305, 54, 169],
            [305, 307, 54],
            [301, 102, 298],
            [298, 102, 297],
            [102, 295, 297],
            [297, 295, 296],
            [300, 102, 301],
            [300, 94, 102],
            [300, 93, 94],
            [300, 97, 93],
            [300, 96, 97],
            [300, 141, 96],
            [300, 138, 141],
            [165, 4, 163],
            [163, 4, 162],
            [4, 160, 162],
            [162, 160, 166],
            [4, 159, 160],
            [4, 158, 159],
            [54, 168, 169],
            [54, 165, 168],
            [54, 4, 165],
            [54, 2, 4],
            [54, 53, 2],
            [1, 50, 6],
            [1, 53, 50],
            [1, 2, 53],
            [6, 55, 11],
            [6, 52, 55],
            [6, 50, 52],
            [11, 42, 16],
            [11, 55, 42],
            [16, 38, 21],
            [16, 44, 38],
            [16, 42, 44],
            [35, 22, 38],
            [22, 21, 38],
            [22, 35, 25],
            [35, 36, 25],
            [25, 36, 24],
            [36, 32, 24],
            [36, 33, 32],
            [307, 308, 54],
            [300, 306, 303],
            [290, 291, 102],
        ],
        convexity=10
    );
}

front_plate_mount_v1();
